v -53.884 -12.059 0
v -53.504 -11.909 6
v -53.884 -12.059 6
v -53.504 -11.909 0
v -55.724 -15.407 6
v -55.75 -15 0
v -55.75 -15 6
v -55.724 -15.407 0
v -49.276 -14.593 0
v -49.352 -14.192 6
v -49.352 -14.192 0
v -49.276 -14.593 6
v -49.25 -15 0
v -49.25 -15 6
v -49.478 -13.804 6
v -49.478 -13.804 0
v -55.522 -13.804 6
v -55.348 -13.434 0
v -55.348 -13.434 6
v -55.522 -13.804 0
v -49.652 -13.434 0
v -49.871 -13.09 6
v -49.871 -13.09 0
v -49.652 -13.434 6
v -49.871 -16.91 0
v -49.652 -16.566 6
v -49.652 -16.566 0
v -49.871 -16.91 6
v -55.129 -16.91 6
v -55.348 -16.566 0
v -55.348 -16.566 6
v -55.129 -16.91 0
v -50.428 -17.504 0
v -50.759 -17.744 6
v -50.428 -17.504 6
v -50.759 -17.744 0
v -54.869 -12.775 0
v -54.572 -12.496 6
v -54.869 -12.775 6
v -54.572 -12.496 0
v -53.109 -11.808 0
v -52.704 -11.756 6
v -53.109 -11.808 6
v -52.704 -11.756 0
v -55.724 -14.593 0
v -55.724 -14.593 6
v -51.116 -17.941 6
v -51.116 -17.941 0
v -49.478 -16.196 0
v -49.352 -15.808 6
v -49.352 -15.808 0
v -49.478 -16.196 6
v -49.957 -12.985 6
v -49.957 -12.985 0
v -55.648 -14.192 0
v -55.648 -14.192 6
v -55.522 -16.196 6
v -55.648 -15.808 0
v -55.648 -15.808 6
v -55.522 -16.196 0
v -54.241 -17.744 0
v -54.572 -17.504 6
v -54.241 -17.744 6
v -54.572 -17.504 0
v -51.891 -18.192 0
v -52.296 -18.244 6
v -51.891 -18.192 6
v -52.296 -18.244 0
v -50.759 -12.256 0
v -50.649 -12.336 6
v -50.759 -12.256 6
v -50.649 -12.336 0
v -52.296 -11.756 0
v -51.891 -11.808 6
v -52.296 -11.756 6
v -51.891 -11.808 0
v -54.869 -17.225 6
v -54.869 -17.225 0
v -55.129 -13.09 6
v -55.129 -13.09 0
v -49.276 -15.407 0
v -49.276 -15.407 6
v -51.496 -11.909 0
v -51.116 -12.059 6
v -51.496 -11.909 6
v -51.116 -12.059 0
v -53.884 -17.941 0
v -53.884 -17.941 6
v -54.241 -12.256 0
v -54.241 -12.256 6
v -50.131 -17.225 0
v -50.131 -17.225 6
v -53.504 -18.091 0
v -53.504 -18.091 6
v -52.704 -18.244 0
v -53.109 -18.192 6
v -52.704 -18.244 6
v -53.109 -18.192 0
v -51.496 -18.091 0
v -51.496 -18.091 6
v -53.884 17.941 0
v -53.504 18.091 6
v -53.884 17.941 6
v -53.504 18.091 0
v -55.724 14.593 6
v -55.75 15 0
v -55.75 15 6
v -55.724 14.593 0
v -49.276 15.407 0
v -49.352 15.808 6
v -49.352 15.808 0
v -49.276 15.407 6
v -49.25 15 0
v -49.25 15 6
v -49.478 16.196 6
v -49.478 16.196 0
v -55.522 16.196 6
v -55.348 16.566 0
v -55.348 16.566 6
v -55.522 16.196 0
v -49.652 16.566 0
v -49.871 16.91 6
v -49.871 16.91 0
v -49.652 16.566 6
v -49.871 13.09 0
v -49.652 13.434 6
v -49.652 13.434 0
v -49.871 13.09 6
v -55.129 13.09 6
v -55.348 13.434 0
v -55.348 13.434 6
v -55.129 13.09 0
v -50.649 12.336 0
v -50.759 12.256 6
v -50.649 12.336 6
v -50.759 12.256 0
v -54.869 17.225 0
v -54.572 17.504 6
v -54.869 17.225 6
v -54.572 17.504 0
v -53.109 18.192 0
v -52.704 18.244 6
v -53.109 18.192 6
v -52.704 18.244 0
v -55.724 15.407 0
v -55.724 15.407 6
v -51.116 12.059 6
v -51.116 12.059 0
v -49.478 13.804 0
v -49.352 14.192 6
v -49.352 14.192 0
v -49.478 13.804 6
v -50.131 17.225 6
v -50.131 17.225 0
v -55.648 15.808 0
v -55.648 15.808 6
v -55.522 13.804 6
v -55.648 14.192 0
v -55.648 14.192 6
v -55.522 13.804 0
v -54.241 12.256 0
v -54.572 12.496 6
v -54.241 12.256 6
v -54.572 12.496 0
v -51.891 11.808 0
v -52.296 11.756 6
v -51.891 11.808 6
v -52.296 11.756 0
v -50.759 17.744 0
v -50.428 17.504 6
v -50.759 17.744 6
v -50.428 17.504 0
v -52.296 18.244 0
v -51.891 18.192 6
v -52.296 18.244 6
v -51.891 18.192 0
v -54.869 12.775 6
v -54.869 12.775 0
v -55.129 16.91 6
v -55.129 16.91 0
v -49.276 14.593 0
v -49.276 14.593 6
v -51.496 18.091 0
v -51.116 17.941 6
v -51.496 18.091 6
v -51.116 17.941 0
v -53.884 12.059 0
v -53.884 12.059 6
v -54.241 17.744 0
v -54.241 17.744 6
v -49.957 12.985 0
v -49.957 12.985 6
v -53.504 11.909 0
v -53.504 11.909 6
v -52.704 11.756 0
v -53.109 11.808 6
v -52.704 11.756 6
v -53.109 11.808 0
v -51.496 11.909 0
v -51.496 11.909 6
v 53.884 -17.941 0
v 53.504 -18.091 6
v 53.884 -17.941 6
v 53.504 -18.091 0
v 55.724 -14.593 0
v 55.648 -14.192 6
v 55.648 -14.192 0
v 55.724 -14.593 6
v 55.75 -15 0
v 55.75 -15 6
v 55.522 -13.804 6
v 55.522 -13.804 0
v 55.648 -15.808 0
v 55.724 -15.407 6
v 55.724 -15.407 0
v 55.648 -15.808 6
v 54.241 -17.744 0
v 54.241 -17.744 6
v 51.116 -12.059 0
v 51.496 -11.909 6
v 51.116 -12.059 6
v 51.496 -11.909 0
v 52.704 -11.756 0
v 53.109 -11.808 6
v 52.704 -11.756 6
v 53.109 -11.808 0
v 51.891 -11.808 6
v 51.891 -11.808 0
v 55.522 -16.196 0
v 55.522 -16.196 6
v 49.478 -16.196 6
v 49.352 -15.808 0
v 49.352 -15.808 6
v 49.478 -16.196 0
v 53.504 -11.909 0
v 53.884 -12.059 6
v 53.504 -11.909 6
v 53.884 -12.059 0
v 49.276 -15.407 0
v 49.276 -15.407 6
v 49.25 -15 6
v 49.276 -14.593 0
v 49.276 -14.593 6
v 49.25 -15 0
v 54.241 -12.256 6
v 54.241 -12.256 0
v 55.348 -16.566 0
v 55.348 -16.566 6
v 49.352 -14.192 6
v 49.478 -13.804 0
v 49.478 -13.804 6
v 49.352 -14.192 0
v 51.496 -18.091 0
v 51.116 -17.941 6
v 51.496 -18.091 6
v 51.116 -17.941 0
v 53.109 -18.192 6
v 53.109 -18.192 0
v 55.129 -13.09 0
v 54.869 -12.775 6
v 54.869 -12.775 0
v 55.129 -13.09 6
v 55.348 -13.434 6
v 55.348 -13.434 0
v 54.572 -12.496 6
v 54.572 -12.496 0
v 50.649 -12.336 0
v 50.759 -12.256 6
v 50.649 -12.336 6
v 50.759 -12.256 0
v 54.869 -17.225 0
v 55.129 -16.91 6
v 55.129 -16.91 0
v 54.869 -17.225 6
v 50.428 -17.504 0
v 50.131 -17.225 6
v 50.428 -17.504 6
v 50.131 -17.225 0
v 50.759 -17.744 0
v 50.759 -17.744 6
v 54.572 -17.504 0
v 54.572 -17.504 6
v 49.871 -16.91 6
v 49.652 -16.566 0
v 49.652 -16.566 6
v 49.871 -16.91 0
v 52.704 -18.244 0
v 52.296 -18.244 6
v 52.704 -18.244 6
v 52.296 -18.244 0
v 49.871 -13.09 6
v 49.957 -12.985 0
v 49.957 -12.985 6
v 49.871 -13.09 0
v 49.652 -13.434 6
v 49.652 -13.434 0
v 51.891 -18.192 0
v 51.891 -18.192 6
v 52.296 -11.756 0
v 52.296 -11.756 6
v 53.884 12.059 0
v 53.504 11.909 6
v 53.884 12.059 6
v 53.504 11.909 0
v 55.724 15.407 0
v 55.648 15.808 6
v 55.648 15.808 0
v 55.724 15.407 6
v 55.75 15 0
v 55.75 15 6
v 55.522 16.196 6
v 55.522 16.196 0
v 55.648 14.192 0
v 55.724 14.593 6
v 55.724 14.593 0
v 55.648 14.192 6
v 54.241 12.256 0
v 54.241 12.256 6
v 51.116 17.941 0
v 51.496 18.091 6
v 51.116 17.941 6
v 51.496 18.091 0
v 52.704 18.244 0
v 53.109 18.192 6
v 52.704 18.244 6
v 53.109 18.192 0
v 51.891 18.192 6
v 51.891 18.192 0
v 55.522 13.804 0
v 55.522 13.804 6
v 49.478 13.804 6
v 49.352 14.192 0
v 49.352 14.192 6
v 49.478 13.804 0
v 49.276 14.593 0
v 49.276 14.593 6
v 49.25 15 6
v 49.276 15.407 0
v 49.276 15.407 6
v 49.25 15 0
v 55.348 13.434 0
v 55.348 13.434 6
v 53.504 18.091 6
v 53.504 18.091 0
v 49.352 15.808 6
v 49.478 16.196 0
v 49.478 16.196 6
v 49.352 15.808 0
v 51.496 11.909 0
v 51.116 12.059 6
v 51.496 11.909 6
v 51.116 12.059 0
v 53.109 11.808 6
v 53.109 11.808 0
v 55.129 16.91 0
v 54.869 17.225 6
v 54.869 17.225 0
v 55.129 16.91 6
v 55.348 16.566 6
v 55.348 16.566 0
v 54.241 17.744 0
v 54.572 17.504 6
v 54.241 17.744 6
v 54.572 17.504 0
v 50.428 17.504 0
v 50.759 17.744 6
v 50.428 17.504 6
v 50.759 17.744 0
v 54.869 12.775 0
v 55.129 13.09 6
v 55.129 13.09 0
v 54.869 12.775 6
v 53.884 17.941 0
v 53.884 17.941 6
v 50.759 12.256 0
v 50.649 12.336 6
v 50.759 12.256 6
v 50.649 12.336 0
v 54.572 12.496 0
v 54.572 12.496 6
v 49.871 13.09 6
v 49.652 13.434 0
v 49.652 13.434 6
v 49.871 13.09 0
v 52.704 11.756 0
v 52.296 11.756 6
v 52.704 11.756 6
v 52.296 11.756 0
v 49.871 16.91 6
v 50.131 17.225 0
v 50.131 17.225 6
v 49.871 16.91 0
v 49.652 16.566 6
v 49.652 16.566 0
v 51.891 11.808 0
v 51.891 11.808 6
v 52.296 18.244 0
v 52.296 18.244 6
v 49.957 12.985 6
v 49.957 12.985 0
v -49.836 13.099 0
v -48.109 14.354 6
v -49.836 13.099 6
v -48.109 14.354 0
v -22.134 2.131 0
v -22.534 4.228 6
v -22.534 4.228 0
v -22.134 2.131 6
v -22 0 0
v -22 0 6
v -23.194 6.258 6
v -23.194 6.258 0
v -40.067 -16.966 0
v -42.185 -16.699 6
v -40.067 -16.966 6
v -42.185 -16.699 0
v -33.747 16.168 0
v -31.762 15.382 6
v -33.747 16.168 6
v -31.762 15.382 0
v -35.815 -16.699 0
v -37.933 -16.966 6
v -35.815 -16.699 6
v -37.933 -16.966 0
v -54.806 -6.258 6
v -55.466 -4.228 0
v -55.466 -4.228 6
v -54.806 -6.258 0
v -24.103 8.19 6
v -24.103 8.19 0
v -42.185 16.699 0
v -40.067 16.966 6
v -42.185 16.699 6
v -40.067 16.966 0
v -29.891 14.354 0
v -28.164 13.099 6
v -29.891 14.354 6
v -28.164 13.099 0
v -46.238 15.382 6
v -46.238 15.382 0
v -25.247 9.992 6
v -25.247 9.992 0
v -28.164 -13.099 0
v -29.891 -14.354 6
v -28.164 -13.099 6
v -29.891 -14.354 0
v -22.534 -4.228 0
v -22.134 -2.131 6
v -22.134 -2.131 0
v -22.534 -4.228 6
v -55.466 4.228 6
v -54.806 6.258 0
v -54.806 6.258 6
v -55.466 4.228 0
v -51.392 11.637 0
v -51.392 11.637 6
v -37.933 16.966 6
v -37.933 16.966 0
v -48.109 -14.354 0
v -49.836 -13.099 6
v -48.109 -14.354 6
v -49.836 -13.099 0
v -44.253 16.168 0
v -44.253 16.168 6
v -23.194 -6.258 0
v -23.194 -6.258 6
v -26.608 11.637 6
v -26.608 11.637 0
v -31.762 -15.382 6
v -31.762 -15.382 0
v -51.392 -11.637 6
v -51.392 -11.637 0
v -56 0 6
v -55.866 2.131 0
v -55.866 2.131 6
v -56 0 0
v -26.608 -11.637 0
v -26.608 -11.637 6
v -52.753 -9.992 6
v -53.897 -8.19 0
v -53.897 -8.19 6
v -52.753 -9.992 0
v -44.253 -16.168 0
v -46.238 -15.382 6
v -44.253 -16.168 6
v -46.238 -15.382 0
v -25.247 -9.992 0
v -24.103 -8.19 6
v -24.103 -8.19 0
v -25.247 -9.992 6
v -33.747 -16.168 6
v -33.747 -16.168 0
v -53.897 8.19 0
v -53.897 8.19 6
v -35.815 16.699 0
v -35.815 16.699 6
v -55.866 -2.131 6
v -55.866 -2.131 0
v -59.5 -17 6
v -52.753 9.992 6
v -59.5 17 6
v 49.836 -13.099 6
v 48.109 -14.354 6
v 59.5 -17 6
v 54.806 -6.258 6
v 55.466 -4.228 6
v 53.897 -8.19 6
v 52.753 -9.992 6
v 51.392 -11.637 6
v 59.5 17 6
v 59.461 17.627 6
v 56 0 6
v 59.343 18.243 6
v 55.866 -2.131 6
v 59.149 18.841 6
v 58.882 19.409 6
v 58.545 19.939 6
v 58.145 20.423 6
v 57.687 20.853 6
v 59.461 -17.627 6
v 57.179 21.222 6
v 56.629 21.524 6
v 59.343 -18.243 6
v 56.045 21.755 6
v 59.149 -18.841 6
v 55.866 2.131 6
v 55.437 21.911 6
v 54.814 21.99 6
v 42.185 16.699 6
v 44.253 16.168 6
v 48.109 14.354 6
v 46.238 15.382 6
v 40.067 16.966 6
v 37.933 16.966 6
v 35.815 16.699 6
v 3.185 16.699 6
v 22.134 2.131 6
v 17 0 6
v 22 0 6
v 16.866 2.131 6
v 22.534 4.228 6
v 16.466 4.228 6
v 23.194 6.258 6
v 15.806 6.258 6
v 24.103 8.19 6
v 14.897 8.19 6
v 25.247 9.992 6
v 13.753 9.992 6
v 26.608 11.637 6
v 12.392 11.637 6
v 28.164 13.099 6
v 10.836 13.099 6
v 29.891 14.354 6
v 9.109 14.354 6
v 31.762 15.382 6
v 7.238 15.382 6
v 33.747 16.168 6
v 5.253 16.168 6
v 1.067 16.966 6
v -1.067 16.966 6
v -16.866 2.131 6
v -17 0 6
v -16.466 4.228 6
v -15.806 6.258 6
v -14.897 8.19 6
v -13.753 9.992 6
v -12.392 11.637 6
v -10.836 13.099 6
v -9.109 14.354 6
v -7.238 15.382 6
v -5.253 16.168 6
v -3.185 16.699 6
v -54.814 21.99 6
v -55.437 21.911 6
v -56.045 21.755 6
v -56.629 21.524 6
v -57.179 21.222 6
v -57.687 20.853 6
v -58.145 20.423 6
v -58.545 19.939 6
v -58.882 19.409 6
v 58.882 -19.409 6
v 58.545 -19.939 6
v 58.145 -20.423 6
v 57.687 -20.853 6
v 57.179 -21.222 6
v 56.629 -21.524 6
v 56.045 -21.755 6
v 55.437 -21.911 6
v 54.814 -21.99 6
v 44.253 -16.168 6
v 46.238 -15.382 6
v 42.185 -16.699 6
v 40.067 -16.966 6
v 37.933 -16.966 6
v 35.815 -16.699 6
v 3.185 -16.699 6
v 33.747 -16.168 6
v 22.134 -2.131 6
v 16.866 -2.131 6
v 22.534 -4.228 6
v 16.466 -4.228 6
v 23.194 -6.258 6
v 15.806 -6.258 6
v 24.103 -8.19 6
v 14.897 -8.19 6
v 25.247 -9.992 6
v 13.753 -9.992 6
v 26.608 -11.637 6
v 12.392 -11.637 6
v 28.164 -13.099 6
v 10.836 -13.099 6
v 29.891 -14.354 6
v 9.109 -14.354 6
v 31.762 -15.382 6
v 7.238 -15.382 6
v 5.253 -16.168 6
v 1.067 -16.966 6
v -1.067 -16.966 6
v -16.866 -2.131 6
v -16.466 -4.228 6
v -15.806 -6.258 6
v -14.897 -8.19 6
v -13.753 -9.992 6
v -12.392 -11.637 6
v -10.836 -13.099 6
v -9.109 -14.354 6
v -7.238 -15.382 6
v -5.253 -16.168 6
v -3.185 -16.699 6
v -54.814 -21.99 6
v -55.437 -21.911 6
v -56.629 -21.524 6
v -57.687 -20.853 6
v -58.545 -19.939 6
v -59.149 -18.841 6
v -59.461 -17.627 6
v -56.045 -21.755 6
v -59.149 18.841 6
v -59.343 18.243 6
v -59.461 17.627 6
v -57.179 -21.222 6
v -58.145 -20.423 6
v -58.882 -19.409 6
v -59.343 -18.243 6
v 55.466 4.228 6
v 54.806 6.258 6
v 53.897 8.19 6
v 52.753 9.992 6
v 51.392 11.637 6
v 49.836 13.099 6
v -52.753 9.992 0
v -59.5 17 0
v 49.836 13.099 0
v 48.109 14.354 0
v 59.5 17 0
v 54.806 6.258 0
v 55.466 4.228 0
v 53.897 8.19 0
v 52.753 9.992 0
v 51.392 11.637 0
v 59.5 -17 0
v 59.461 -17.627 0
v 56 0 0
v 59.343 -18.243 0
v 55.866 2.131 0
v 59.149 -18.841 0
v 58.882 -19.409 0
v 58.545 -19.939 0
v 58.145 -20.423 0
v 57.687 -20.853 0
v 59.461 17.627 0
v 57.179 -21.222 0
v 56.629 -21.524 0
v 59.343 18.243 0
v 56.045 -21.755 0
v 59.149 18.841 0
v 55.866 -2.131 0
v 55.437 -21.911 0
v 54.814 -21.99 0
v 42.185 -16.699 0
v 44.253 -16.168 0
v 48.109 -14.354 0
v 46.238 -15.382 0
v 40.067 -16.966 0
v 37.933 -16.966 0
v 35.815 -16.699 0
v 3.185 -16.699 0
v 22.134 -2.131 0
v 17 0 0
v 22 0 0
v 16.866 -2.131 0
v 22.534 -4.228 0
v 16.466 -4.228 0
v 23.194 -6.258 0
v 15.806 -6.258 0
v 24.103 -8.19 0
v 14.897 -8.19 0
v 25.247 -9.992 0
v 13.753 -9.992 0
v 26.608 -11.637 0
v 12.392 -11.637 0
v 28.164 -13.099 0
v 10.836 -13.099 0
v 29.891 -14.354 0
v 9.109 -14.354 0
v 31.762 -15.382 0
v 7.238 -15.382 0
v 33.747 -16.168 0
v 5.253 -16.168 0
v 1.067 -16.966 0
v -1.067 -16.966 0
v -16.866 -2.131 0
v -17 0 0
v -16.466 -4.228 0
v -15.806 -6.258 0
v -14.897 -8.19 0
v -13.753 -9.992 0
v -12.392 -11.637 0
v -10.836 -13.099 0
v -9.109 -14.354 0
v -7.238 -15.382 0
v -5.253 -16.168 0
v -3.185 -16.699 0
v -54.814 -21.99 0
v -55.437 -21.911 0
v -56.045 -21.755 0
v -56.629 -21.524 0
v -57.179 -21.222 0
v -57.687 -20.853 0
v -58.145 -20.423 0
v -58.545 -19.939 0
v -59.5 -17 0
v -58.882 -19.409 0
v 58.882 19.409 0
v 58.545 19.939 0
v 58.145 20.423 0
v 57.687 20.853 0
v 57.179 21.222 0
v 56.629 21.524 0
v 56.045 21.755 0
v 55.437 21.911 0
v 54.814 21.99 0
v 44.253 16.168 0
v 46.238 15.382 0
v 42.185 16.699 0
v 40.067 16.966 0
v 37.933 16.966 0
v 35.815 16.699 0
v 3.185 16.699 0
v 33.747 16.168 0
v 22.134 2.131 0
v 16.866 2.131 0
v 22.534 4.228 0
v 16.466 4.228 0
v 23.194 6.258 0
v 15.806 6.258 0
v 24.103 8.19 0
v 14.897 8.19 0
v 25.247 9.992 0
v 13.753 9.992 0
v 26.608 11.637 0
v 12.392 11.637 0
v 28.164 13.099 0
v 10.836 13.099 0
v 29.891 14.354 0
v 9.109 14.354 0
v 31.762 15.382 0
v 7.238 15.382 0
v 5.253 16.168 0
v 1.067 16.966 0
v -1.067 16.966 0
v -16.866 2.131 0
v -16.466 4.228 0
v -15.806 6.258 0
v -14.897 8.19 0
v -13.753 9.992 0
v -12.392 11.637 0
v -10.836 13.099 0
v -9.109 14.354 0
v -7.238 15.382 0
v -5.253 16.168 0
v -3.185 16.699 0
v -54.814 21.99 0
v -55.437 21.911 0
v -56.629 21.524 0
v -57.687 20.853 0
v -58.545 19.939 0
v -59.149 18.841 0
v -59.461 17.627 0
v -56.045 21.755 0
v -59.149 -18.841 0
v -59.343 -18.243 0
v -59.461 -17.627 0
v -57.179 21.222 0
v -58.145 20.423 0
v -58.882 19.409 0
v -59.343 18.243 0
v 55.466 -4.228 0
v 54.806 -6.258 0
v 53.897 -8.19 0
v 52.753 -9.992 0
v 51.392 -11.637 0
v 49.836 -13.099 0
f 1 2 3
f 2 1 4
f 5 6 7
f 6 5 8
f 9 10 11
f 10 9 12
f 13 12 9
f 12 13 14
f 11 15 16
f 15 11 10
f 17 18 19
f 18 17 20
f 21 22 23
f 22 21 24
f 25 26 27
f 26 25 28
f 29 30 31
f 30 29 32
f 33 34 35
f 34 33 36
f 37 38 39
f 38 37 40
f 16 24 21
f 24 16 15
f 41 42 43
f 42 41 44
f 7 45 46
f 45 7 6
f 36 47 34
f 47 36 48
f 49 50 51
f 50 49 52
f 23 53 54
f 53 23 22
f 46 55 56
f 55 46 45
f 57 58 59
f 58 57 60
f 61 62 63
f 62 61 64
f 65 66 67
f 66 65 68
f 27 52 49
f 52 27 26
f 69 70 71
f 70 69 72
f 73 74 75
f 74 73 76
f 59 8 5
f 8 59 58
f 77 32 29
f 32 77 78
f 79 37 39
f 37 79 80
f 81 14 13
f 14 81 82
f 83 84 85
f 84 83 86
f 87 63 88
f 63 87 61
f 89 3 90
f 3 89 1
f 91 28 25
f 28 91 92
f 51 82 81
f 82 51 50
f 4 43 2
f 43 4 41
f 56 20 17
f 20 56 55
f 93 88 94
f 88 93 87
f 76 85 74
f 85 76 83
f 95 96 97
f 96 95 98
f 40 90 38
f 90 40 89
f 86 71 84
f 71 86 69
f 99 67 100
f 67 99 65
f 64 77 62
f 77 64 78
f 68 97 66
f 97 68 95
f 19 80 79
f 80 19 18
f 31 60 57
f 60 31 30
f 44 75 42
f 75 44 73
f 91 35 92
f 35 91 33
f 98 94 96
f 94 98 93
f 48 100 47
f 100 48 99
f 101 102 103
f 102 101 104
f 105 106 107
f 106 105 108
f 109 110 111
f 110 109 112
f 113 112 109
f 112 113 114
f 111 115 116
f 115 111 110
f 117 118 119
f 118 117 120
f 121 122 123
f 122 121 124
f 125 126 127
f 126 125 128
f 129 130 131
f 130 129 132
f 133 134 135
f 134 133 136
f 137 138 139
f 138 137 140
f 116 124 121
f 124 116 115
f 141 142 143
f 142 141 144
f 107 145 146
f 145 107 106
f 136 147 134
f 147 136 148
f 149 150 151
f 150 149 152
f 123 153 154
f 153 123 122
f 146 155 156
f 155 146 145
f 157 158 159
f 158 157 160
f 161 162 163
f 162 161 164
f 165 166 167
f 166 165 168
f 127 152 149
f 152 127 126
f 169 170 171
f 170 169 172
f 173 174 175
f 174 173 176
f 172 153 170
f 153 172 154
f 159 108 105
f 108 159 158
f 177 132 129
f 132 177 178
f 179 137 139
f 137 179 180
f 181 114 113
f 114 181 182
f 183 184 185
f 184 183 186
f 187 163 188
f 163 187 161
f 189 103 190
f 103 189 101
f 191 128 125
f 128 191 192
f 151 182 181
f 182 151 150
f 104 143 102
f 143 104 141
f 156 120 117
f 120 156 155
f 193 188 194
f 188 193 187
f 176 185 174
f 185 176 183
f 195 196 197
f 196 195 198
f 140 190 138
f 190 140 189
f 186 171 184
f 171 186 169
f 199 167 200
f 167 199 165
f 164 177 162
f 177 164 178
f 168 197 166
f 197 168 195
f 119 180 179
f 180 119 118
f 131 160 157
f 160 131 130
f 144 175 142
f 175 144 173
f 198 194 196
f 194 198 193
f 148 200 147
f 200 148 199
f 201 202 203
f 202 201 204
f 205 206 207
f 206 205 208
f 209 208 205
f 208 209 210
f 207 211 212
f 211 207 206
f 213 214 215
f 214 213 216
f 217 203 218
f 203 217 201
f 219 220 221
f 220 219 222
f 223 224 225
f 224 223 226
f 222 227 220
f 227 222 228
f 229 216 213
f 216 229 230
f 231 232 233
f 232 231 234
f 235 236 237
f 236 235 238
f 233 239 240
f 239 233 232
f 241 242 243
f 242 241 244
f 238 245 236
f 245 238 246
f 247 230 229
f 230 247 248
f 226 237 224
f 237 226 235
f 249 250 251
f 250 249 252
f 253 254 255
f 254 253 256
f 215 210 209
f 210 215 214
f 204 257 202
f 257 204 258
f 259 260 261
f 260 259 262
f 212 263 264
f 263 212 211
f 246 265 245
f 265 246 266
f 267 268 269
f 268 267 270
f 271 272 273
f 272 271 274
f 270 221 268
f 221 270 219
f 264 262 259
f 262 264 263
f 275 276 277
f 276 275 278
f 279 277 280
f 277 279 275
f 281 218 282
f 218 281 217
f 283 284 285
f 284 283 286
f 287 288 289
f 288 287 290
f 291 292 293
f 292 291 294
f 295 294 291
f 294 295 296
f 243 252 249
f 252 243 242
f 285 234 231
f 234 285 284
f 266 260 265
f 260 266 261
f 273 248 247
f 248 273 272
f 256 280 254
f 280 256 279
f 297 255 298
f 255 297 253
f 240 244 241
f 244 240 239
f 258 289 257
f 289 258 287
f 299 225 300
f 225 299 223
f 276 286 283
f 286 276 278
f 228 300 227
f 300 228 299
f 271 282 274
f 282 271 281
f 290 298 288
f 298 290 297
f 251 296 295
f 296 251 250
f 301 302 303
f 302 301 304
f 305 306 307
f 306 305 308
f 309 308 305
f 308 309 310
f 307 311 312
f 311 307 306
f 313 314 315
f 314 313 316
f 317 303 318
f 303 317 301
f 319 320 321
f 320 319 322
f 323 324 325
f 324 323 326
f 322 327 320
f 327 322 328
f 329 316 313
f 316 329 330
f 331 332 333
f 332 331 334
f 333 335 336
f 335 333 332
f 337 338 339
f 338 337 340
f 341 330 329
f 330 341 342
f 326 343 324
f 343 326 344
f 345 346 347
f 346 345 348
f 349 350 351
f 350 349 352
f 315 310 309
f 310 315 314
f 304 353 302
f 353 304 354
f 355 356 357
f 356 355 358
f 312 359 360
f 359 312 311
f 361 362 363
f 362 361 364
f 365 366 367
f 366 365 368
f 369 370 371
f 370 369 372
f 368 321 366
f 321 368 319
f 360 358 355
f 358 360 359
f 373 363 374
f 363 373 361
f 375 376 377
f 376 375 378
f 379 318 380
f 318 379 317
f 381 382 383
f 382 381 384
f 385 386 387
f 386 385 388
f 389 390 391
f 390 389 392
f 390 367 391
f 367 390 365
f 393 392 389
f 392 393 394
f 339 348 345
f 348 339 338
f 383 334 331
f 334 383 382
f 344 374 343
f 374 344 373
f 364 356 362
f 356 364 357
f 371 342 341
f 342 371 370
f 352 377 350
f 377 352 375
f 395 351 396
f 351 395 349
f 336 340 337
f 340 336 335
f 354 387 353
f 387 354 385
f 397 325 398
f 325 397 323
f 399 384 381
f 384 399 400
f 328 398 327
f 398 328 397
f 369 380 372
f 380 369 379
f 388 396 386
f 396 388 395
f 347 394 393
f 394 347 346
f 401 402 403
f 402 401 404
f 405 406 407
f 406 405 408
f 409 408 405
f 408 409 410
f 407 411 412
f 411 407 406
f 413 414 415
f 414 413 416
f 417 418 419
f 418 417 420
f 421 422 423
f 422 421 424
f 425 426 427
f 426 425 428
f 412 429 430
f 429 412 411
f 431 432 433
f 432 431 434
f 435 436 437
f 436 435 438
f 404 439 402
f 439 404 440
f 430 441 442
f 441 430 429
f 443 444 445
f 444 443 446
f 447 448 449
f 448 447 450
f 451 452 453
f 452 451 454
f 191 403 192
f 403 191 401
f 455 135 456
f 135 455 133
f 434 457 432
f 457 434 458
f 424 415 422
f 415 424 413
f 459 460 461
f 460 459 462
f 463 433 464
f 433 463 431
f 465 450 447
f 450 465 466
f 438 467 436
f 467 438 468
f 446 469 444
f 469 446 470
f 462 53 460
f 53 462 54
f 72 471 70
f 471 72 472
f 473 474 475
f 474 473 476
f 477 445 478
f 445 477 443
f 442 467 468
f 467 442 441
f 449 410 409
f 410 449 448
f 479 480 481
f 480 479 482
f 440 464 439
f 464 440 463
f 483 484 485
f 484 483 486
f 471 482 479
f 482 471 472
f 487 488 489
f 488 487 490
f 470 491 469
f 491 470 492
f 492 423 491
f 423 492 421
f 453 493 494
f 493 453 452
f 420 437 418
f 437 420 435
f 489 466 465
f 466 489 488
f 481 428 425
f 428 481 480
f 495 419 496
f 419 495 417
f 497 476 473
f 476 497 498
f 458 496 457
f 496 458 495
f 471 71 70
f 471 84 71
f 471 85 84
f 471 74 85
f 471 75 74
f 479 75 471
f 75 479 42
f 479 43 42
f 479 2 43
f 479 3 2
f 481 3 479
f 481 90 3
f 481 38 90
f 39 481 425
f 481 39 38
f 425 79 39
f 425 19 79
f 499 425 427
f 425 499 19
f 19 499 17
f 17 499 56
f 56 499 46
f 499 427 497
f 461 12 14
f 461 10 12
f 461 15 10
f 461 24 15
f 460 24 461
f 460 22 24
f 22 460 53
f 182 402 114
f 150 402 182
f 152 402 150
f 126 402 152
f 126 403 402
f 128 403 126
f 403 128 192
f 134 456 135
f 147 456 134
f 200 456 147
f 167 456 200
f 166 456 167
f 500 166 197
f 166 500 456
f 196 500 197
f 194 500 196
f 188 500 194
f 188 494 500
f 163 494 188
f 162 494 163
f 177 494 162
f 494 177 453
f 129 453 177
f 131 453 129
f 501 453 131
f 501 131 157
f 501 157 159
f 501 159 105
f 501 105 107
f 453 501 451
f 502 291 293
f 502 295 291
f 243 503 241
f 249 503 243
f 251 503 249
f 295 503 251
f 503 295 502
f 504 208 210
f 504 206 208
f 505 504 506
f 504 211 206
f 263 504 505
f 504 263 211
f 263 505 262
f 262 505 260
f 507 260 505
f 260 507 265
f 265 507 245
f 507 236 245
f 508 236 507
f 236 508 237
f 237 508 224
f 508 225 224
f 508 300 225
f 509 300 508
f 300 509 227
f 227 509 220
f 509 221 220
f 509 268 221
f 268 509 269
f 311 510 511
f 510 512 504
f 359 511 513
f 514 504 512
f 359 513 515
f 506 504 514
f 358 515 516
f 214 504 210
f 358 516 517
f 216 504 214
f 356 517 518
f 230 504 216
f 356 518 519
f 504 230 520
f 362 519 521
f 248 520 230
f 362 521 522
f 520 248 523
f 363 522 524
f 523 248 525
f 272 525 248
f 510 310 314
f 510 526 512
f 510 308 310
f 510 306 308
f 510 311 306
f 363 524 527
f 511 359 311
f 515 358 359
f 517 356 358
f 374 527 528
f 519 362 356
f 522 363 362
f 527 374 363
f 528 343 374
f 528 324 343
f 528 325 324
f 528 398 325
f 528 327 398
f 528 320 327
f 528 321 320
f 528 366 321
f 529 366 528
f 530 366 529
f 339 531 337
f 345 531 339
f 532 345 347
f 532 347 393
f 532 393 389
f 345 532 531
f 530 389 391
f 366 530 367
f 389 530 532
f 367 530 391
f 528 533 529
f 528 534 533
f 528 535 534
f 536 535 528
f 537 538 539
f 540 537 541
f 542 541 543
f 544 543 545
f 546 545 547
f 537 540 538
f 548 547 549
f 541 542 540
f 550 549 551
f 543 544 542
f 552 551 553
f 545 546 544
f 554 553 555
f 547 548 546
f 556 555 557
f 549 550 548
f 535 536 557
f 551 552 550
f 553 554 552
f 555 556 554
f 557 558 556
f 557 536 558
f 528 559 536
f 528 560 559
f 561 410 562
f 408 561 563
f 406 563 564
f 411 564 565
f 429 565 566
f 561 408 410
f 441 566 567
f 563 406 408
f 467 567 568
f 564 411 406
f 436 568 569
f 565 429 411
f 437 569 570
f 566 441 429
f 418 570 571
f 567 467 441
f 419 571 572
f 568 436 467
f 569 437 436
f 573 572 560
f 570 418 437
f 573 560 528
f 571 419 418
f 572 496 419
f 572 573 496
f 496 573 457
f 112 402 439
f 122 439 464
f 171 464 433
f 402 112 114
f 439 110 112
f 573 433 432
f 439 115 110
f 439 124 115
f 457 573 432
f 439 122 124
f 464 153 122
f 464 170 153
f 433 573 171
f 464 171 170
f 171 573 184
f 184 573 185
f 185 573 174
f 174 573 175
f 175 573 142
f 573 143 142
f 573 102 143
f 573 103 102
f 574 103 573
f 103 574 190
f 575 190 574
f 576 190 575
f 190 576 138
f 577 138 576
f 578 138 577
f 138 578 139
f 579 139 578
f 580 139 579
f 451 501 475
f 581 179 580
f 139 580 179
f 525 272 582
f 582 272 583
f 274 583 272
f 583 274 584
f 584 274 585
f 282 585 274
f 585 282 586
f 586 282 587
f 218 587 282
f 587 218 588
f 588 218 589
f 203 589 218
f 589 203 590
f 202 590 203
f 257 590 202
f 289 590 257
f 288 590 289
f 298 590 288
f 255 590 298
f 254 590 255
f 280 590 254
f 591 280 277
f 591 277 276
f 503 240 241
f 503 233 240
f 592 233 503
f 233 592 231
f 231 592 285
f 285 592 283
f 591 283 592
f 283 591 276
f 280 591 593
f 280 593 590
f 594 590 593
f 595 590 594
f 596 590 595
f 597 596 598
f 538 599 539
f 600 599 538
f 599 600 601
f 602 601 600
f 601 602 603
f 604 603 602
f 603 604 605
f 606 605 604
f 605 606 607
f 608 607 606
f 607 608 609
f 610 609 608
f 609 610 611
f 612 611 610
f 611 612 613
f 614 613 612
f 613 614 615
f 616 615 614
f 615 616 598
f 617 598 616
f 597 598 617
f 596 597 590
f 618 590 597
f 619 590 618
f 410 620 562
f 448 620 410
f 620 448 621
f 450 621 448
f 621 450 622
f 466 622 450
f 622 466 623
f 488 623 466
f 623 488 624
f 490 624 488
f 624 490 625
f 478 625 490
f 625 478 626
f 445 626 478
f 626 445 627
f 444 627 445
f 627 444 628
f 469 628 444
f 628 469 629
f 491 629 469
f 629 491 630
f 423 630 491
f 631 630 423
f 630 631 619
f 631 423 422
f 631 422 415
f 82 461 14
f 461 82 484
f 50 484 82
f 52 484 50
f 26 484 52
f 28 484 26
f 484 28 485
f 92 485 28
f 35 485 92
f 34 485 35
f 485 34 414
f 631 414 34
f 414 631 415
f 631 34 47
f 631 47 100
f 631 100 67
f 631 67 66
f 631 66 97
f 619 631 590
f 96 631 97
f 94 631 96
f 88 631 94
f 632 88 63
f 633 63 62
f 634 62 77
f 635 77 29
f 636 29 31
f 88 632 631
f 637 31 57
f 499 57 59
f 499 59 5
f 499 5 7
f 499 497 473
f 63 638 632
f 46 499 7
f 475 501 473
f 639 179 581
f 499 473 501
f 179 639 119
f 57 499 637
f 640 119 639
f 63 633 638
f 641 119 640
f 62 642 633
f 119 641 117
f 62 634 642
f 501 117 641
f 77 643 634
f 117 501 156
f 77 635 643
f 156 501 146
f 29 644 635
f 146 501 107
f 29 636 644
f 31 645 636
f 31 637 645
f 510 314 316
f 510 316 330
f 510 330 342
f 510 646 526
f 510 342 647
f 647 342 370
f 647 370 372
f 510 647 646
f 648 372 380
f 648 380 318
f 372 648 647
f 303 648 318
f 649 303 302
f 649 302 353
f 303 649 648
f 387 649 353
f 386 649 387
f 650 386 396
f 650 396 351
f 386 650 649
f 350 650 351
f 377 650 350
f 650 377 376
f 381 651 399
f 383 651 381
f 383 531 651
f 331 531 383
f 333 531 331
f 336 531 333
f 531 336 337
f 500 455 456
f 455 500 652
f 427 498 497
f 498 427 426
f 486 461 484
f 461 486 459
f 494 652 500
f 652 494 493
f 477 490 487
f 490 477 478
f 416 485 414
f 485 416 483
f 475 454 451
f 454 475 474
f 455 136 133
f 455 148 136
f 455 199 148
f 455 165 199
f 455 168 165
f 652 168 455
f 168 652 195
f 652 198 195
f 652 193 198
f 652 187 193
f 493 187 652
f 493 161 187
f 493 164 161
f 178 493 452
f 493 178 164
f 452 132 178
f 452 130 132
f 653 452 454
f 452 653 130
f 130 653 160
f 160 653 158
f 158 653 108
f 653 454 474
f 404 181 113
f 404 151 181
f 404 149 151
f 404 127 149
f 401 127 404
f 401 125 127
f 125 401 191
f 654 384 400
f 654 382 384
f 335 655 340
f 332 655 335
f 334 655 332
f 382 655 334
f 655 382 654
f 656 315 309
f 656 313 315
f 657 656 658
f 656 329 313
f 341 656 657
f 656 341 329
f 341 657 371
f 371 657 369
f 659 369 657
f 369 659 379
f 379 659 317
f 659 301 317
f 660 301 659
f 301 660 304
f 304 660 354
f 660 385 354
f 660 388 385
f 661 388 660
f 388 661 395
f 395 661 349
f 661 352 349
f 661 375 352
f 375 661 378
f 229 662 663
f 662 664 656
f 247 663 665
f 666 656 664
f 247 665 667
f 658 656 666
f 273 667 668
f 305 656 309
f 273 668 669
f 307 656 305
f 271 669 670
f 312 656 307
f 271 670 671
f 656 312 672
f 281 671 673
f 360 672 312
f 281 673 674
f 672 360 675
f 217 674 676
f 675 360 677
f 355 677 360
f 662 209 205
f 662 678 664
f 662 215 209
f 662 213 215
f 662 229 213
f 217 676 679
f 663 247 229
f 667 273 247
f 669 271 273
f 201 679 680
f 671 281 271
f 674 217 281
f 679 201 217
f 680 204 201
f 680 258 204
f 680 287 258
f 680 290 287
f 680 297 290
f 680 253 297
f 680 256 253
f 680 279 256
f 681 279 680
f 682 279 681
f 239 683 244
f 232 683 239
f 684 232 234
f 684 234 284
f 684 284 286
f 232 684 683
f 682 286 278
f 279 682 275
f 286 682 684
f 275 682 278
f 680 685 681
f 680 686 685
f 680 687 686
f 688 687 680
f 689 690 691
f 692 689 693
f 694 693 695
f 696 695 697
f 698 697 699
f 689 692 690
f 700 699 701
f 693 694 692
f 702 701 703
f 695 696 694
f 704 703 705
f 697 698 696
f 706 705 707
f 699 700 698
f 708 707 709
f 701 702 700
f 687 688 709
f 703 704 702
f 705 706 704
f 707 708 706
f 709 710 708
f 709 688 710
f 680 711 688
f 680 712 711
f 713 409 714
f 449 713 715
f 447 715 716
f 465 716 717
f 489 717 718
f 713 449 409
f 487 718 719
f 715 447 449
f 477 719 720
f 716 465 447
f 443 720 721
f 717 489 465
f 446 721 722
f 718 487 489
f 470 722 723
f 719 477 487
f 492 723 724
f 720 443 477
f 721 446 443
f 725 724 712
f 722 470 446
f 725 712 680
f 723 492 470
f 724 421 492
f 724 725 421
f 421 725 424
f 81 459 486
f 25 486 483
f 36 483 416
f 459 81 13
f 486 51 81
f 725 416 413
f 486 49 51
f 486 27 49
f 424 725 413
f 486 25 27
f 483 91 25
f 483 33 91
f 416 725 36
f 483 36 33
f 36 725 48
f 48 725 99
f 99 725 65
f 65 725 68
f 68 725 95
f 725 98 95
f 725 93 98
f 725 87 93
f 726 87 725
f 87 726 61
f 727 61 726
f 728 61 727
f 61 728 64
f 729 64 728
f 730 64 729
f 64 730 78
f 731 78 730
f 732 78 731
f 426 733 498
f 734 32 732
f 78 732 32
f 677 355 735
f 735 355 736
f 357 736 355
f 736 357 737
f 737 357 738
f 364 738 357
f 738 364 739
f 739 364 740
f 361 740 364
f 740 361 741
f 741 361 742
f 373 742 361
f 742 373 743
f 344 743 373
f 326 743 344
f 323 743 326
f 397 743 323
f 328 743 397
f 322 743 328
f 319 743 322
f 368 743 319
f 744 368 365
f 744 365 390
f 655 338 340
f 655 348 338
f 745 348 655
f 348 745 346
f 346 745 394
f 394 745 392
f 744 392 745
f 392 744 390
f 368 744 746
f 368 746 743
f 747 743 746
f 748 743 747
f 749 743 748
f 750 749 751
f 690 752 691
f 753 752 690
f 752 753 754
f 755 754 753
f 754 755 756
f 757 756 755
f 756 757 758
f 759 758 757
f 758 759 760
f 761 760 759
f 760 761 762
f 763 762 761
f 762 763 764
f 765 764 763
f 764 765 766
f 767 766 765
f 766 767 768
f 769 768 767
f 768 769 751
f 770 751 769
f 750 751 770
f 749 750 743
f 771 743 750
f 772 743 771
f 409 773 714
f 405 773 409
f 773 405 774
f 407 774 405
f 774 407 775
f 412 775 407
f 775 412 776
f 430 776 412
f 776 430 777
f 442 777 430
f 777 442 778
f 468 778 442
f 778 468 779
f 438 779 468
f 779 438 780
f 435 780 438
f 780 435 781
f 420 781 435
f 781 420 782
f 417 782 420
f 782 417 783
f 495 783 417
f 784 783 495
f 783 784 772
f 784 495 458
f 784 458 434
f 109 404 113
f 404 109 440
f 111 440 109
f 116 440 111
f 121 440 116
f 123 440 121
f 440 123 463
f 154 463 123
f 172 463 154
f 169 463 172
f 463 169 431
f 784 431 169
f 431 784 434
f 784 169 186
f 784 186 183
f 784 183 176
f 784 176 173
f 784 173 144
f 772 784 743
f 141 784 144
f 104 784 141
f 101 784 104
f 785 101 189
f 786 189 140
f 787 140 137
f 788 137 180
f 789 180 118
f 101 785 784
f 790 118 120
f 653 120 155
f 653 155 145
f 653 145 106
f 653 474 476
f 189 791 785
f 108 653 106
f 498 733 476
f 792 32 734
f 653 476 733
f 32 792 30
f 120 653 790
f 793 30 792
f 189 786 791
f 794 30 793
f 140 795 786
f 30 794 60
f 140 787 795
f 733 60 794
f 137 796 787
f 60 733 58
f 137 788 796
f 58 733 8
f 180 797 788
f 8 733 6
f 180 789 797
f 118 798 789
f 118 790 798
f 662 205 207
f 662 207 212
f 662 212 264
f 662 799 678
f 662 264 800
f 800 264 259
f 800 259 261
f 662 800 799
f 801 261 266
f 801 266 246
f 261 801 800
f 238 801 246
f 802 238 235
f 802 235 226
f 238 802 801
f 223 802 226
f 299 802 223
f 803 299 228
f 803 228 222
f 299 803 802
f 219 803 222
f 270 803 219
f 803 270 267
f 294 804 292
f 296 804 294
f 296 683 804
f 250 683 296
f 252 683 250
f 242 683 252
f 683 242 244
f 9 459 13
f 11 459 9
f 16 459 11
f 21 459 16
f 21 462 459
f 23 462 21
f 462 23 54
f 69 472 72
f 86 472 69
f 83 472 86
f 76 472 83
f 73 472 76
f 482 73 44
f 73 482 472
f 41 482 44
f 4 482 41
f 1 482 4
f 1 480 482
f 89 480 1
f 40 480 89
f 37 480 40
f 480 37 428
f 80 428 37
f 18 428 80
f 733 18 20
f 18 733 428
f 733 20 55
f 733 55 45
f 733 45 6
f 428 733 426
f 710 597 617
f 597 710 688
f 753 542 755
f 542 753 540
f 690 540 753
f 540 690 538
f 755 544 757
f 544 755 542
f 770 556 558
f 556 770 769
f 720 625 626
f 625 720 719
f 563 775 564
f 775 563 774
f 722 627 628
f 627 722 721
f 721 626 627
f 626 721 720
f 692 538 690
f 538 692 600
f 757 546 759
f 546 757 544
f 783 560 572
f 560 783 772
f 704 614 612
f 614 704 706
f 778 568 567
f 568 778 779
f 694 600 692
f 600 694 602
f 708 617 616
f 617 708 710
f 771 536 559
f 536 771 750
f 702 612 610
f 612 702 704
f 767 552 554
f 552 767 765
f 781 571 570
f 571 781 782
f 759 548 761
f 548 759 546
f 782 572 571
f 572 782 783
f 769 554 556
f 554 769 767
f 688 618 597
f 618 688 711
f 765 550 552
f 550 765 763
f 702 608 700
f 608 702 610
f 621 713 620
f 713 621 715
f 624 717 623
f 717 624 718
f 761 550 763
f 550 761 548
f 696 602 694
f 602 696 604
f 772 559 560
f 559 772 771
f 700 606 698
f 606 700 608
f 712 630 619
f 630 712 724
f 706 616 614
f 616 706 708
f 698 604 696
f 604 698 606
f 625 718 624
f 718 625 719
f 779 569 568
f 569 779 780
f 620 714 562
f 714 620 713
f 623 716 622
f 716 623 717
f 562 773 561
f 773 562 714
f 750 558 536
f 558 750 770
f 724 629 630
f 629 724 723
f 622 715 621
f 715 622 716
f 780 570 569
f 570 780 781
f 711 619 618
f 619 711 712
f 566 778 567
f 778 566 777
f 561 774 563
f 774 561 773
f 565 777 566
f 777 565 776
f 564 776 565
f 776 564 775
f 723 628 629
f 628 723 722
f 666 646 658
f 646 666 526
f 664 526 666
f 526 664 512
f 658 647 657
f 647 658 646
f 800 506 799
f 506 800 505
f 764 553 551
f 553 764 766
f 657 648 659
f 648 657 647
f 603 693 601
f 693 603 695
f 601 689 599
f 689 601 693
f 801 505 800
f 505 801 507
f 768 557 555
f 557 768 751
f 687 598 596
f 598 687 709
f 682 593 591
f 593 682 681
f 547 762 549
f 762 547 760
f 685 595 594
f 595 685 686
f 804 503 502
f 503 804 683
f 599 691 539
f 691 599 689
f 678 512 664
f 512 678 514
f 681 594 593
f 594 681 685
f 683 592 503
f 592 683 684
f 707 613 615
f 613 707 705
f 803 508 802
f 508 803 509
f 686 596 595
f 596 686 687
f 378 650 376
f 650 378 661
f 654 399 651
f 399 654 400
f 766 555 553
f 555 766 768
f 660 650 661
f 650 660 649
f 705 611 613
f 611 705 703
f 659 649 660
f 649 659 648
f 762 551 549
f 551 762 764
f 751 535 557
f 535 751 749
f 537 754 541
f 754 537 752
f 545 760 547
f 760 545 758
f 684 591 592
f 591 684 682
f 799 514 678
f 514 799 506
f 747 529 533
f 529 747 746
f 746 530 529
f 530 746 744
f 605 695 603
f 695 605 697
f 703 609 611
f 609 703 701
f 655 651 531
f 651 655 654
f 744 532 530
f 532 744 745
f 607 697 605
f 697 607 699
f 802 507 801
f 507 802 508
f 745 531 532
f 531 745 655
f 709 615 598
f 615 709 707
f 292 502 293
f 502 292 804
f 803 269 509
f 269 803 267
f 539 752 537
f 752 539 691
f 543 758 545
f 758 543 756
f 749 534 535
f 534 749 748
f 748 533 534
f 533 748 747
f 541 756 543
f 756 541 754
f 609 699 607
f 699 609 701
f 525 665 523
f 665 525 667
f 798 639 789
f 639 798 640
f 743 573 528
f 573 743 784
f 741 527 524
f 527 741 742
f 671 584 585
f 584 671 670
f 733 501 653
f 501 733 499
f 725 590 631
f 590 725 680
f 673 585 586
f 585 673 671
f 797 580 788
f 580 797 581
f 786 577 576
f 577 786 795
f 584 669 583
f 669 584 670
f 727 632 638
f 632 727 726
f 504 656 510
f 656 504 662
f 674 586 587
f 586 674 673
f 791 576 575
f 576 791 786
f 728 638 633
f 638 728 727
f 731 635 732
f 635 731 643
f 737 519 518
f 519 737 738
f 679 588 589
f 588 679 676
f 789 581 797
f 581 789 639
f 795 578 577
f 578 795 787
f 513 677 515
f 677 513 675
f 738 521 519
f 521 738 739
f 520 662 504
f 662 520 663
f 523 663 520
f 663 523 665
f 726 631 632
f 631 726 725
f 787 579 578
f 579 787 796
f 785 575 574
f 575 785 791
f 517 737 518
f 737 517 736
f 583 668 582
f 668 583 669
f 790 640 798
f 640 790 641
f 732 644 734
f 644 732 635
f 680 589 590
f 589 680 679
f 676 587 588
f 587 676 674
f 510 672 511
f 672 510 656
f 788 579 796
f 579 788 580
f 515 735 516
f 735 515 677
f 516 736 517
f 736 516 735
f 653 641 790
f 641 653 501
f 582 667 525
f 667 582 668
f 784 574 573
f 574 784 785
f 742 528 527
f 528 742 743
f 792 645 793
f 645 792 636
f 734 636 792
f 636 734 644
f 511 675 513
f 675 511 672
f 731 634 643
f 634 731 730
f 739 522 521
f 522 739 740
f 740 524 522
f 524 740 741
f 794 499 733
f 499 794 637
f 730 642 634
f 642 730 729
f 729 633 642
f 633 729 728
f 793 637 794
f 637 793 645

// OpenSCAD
$fn = 50;


difference() {
	union() {
		hull() {
			translate(v = [-54.5000000000, 17.0000000000, 0]) {
				cylinder(h = 6, r = 5);
			}
			translate(v = [54.5000000000, 17.0000000000, 0]) {
				cylinder(h = 6, r = 5);
			}
			translate(v = [-54.5000000000, -17.0000000000, 0]) {
				cylinder(h = 6, r = 5);
			}
			translate(v = [54.5000000000, -17.0000000000, 0]) {
				cylinder(h = 6, r = 5);
			}
		}
	}
	union() {
		#translate(v = [-52.5000000000, -15.0000000000, -100.0000000000]) {
			cylinder(h = 200, r = 3.2500000000);
		}
		#translate(v = [-52.5000000000, 15.0000000000, -100.0000000000]) {
			cylinder(h = 200, r = 3.2500000000);
		}
		#translate(v = [52.5000000000, -15.0000000000, -100.0000000000]) {
			cylinder(h = 200, r = 3.2500000000);
		}
		#translate(v = [52.5000000000, 15.0000000000, -100.0000000000]) {
			cylinder(h = 200, r = 3.2500000000);
		}
		#translate(v = [-39.0000000000, 0, 0]) {
			cylinder(h = 6, r = 17.0000000000);
		}
		#cylinder(h = 6, r = 17.0000000000);
		#translate(v = [39.0000000000, 0, 0]) {
			cylinder(h = 6, r = 17.0000000000);
		}
	}
}
